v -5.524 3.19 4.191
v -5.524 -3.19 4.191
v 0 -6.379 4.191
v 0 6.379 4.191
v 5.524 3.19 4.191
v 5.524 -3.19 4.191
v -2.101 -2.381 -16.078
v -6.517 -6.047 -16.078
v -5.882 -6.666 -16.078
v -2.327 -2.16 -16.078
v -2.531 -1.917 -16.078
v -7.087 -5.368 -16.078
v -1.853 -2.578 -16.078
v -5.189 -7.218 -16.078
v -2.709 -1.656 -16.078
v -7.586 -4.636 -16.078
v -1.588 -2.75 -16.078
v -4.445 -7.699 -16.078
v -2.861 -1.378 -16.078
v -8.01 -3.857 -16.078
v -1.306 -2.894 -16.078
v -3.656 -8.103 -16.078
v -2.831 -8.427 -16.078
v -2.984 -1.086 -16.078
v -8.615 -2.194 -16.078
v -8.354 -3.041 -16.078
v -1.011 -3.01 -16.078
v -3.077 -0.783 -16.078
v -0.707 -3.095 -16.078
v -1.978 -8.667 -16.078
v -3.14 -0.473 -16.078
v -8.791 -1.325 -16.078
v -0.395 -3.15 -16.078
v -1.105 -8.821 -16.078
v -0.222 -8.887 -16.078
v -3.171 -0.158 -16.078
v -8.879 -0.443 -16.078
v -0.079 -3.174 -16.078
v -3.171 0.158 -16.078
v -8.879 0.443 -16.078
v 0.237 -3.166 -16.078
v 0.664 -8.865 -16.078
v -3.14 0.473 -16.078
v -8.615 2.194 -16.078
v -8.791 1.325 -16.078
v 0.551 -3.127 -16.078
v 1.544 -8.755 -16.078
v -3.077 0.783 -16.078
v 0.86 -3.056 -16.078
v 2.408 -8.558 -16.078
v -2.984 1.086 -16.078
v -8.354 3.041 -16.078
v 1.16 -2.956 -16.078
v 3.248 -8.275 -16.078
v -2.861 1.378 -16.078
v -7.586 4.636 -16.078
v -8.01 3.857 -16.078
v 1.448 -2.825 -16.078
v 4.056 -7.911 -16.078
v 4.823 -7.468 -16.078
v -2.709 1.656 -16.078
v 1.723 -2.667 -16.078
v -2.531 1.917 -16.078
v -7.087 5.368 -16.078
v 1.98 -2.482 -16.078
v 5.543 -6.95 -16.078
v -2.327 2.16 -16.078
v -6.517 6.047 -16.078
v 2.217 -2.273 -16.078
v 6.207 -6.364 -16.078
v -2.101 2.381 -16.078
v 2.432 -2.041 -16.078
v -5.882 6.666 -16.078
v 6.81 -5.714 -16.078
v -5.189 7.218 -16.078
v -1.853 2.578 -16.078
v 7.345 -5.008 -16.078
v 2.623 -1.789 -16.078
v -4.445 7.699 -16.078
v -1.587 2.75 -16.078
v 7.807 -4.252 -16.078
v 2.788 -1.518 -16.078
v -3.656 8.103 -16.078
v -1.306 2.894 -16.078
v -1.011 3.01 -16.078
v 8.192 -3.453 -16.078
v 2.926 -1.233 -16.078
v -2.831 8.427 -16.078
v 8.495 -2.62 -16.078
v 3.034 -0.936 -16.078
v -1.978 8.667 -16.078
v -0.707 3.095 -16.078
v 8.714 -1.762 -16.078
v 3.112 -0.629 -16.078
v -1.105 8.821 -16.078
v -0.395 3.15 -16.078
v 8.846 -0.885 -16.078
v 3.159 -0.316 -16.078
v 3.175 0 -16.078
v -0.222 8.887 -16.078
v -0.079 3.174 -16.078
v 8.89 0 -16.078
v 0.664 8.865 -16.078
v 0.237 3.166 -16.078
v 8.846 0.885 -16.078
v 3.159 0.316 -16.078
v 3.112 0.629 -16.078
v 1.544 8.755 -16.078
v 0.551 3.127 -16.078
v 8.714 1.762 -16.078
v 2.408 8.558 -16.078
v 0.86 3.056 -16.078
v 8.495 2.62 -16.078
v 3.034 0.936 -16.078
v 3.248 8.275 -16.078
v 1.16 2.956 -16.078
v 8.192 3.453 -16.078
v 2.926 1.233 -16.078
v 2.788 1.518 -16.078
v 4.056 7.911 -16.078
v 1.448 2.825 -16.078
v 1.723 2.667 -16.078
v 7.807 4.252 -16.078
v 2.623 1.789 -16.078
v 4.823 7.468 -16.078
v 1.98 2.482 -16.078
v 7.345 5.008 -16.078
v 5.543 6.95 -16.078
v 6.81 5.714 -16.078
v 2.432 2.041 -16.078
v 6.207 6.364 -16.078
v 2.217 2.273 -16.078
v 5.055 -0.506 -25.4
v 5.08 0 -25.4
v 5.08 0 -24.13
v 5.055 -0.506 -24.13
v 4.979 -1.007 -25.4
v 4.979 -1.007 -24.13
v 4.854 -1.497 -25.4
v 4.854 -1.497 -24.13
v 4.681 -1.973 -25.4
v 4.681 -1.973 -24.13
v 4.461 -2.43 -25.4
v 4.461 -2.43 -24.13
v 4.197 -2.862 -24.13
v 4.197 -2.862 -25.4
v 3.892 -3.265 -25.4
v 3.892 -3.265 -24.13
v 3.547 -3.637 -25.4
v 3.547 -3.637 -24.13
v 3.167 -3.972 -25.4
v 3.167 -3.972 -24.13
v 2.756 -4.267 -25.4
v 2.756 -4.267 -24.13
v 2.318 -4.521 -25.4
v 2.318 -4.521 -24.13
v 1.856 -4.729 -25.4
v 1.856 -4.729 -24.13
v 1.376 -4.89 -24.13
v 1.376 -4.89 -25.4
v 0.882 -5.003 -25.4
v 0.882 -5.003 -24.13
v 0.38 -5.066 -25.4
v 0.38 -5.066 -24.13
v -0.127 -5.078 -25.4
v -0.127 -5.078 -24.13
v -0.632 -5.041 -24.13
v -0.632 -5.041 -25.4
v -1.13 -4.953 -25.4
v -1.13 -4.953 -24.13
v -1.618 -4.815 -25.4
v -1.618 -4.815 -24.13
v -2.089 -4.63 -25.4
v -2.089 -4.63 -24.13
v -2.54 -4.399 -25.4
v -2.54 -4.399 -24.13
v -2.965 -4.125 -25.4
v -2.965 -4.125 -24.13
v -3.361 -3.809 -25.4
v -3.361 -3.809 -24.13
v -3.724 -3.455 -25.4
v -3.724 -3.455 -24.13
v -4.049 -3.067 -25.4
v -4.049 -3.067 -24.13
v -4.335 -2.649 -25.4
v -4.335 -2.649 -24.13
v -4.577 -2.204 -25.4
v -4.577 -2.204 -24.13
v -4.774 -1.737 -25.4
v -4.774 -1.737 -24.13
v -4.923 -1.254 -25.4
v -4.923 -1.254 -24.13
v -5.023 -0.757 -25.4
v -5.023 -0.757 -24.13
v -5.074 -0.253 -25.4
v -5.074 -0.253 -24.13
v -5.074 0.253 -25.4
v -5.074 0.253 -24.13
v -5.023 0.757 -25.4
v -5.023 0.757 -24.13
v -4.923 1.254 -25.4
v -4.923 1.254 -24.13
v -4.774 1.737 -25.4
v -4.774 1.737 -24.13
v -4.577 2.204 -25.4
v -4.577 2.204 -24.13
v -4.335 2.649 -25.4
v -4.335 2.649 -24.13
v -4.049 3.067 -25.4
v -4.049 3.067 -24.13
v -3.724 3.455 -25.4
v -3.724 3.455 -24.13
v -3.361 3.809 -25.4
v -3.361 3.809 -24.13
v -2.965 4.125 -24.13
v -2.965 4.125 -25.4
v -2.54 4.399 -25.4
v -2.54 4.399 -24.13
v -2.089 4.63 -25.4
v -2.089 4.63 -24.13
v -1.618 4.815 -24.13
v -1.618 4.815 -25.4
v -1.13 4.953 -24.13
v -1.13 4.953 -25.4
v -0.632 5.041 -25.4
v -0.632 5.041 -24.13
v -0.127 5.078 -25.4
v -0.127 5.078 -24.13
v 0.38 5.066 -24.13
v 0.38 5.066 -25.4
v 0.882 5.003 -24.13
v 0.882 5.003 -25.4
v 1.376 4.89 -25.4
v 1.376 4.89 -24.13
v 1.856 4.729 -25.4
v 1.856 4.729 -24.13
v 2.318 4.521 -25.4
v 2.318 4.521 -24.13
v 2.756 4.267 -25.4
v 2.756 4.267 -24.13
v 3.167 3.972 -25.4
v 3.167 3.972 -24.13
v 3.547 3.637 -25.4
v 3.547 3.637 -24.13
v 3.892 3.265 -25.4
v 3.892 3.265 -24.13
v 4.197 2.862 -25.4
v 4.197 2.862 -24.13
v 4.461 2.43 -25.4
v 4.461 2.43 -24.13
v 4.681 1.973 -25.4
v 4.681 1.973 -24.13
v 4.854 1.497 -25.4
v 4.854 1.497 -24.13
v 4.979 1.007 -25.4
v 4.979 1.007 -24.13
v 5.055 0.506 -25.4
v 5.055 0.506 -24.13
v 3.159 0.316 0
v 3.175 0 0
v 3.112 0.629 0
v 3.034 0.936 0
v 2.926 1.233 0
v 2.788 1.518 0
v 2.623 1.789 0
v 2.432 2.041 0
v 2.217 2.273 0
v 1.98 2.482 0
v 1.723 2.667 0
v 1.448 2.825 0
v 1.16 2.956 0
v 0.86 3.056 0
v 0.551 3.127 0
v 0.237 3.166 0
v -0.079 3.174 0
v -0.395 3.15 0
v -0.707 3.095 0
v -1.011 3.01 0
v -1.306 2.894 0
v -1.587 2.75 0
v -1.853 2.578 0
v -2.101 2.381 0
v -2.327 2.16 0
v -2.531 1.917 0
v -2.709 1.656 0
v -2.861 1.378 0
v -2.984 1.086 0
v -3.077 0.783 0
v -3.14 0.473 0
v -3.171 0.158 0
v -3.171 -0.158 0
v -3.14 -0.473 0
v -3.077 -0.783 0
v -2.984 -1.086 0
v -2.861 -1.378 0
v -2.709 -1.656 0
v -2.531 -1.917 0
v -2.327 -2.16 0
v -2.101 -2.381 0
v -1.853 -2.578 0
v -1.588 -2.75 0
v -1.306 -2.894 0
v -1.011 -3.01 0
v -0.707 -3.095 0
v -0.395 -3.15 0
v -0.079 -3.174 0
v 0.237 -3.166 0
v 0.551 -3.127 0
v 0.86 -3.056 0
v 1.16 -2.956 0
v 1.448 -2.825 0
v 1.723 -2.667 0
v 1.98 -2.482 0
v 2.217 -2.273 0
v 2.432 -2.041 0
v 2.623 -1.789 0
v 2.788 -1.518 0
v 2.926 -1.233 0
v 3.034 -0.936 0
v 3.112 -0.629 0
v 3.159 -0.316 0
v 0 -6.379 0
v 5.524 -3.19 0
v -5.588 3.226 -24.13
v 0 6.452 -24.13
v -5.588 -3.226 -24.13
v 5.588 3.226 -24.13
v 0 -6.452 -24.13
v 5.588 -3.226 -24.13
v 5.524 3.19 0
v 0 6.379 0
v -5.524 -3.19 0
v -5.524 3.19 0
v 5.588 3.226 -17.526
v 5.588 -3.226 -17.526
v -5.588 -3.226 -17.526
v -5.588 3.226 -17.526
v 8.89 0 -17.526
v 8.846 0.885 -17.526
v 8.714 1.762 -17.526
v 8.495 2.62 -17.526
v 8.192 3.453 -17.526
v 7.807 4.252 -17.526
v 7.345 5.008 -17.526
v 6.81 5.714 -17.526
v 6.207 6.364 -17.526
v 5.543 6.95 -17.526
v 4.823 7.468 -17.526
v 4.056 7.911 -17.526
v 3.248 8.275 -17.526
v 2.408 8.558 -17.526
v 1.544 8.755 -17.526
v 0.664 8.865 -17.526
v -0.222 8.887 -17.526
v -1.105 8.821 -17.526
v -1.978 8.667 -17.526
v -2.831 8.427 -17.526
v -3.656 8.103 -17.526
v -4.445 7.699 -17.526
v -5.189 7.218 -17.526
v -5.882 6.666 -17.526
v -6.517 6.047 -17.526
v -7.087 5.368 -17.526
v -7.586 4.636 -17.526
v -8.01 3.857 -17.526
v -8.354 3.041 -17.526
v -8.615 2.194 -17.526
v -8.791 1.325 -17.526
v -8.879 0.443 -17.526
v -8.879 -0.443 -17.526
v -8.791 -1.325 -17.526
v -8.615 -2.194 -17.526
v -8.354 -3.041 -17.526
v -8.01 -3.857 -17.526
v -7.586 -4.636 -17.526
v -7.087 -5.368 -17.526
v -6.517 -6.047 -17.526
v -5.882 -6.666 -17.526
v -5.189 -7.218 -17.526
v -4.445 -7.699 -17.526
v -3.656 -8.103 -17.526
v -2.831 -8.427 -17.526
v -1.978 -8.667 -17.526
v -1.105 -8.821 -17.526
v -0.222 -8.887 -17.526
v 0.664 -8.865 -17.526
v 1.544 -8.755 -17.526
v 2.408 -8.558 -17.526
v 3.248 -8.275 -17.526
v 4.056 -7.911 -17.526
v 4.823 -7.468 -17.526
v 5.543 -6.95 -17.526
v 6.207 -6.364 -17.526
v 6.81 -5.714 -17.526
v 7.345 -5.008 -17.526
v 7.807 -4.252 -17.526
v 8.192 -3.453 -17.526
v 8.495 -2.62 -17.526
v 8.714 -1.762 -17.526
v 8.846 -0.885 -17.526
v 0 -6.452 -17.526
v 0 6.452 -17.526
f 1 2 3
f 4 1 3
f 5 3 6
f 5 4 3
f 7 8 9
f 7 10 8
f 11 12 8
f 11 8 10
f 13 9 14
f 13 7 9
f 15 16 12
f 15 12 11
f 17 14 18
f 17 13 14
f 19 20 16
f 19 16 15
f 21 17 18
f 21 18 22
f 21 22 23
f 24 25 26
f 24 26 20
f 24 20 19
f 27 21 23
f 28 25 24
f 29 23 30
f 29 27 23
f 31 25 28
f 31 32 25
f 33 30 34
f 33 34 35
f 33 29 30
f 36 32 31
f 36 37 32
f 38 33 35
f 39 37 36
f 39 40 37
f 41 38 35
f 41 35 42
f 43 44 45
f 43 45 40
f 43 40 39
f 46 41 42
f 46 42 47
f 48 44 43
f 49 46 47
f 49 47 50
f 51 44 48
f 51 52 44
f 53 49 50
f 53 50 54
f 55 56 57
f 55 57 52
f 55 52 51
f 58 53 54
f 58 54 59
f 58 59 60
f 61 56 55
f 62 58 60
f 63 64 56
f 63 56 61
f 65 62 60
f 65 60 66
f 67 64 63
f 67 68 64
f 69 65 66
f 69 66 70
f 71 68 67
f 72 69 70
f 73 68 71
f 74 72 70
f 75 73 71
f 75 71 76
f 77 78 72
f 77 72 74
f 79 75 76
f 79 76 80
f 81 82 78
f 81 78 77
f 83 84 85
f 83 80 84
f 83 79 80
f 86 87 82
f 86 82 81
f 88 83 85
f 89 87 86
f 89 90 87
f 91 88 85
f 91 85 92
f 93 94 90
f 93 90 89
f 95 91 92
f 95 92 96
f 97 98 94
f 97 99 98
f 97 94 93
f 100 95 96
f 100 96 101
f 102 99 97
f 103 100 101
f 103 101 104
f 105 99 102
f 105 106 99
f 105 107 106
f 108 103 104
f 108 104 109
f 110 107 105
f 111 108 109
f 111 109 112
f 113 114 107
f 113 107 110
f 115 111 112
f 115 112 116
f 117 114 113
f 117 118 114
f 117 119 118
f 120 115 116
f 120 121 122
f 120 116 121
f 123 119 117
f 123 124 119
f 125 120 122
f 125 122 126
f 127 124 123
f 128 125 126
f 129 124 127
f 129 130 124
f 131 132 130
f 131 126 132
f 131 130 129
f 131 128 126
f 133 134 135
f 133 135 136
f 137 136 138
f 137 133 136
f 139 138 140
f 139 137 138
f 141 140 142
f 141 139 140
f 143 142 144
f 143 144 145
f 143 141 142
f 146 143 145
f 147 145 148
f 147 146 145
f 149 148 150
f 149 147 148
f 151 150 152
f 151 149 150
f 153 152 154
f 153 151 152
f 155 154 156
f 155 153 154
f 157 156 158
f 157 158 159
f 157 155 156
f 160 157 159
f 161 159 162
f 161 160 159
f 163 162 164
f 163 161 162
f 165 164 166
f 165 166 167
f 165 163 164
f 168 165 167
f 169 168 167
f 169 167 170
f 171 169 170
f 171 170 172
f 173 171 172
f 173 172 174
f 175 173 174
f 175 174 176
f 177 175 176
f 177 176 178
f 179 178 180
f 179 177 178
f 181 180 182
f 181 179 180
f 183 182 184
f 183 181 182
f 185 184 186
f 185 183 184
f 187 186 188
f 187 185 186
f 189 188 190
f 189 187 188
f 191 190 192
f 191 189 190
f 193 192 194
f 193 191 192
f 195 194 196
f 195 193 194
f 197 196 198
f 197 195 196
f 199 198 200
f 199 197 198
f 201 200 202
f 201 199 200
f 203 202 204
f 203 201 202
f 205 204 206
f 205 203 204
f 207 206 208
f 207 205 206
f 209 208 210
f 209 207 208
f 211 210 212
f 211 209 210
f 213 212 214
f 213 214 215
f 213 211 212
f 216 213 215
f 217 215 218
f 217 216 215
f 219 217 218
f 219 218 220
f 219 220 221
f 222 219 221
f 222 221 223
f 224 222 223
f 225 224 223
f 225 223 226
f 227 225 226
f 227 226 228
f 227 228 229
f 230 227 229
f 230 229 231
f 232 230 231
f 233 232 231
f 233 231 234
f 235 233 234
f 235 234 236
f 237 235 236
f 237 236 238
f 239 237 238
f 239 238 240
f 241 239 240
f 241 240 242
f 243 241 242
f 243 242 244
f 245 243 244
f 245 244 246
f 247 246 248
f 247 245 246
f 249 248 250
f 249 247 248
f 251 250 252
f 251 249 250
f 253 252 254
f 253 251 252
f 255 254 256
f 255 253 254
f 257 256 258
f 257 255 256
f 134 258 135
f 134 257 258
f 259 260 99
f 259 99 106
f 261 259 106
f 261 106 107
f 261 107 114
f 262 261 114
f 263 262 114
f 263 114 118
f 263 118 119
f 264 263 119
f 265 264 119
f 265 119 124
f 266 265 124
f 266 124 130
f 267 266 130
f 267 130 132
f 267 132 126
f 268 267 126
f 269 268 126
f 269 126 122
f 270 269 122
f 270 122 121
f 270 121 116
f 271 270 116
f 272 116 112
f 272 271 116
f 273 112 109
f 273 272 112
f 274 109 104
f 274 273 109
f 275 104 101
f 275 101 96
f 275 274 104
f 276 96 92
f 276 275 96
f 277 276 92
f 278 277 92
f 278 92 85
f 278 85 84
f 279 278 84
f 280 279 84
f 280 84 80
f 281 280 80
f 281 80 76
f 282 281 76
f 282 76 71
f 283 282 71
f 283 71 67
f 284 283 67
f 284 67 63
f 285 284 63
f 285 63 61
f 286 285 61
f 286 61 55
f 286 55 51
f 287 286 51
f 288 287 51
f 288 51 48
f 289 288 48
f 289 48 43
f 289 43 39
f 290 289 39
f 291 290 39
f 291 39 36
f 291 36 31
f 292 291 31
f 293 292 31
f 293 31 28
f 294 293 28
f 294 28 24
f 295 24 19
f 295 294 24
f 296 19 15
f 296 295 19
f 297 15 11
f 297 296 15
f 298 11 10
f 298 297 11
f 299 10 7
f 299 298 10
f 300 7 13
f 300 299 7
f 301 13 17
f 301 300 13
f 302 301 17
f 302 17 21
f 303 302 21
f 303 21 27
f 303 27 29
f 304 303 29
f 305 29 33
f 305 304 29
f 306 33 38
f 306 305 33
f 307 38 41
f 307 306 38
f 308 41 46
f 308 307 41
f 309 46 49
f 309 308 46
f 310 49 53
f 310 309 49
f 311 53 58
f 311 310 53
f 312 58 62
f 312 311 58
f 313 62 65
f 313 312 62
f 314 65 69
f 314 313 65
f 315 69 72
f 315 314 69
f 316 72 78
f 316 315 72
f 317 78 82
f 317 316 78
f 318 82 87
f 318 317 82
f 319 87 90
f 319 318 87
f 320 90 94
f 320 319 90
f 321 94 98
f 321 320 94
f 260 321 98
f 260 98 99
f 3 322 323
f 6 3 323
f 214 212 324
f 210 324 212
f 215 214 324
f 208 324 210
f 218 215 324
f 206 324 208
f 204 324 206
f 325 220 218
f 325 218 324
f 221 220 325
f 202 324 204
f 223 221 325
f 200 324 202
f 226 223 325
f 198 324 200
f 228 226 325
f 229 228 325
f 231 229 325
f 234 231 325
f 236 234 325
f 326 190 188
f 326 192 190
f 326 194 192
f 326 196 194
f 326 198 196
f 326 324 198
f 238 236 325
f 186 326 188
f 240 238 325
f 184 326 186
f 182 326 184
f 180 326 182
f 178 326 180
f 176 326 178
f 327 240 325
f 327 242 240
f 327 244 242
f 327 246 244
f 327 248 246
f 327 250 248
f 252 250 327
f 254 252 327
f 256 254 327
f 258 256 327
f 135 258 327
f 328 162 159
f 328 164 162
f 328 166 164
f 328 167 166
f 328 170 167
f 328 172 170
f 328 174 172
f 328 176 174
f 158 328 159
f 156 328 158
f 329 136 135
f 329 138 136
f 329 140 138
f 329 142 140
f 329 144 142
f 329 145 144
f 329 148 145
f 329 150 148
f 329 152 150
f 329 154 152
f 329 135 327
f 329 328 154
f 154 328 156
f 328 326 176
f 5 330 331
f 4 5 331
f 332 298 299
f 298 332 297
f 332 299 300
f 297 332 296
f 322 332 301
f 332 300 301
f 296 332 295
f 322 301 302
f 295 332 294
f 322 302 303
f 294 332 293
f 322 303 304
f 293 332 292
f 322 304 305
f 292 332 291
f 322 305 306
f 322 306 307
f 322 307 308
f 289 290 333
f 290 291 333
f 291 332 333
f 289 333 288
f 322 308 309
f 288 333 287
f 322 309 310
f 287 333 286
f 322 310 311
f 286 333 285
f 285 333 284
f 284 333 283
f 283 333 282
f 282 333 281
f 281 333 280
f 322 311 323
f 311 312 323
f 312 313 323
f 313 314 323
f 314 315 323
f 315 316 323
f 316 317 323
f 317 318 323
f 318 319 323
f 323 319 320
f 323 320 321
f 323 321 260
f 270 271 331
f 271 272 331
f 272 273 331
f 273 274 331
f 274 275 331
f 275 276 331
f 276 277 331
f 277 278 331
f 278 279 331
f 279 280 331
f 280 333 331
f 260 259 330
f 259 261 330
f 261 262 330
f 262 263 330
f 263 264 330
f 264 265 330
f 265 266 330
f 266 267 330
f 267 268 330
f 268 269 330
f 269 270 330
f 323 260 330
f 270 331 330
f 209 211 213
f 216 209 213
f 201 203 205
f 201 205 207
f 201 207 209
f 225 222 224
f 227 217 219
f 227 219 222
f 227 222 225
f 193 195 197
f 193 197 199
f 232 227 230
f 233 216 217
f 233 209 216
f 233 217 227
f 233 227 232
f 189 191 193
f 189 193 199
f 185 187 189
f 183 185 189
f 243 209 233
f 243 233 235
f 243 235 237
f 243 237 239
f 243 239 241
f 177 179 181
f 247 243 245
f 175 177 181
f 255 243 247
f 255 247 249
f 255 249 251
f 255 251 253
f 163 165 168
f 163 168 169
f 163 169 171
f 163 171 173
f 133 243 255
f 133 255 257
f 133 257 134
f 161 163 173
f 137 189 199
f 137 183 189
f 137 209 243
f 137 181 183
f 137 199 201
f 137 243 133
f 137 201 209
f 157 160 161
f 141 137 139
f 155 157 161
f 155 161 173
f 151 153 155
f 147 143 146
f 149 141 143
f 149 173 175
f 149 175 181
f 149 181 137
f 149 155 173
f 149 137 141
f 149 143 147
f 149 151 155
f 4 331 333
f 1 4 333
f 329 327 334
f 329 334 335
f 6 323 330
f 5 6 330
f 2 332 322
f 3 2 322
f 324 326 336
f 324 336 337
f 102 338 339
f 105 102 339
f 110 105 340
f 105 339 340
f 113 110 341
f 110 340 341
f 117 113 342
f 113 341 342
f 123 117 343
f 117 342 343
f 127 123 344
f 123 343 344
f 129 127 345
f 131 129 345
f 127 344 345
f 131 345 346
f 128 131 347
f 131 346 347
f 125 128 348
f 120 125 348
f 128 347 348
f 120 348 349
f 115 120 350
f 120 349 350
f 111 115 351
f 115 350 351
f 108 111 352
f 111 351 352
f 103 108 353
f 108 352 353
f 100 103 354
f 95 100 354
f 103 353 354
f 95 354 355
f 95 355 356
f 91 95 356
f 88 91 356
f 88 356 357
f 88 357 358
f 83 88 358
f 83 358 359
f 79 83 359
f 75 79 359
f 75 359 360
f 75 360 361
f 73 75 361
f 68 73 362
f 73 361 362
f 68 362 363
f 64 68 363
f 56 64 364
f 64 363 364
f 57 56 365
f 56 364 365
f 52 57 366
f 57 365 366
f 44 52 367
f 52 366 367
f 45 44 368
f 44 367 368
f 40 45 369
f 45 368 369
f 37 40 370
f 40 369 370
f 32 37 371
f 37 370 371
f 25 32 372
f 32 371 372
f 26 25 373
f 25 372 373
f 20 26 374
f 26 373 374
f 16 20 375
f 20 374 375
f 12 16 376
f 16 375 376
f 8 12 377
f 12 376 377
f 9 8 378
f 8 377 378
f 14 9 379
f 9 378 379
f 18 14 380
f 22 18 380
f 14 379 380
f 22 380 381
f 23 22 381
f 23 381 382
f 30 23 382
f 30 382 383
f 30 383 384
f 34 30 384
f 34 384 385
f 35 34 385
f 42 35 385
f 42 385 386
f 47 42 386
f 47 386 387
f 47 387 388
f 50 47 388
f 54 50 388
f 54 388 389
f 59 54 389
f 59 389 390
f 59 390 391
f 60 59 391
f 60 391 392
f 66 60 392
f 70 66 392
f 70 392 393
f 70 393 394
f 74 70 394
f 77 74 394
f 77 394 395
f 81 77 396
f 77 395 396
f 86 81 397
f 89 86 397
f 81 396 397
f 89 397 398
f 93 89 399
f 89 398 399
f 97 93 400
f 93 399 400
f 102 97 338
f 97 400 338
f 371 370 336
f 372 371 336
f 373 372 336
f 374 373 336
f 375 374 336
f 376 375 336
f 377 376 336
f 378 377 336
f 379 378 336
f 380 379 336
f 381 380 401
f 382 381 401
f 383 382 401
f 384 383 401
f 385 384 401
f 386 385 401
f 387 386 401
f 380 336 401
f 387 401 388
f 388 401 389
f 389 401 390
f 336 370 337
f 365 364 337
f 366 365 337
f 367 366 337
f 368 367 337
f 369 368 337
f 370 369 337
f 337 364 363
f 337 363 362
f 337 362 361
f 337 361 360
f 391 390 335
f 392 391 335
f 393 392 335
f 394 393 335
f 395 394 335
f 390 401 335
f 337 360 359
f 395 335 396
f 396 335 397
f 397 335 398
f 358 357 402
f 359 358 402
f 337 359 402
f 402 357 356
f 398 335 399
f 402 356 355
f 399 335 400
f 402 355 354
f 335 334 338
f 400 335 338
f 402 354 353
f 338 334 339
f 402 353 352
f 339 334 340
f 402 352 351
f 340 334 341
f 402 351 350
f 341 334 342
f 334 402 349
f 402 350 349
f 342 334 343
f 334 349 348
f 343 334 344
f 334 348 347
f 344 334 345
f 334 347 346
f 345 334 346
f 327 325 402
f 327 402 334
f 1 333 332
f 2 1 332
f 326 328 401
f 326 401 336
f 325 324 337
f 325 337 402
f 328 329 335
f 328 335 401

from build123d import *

# Parameters (mm, degrees)
F0_R     = 3.175
F1_DEPTH = 25.4
F3_DEPTH = 4.191
F5_DEPTH = 7.874
F6_R     = 8.89
F7_DEPTH = 1.4478
F8_R     = 5.08
F9_DEPTH = 1.27


with BuildPart() as f1:
    # F0 (on Top) → F1 (new body)
    with BuildSketch(Plane.XY):
        Circle(F0_R)
    extrude(amount=-F1_DEPTH)

    # F2 (on face) → F3 (join)
    with BuildSketch(Plane.XY):
        Polygon((5.5245, 3.189572), (0, 6.379143), (-5.5245, 3.189572), (-5.5245, -3.189572), (0, -6.379143), (5.5245, -3.189572), align=None)
    extrude(amount=F3_DEPTH)

    # F4 (on face) → F5 (join)
    with BuildSketch(Plane(origin=(0, 0, -25.4), x_dir=(1, 0, 0), z_dir=(0, 0, -1))):
        Polygon((5.588, 3.226233), (0, 6.452467), (-5.588, 3.226233), (-5.588, -3.226233), (0, -6.452467), (5.588, -3.226233), align=None)
    extrude(amount=-F5_DEPTH)

    # F6 (on face) → F7 (join)
    with BuildSketch(Plane.XY.offset(-17.526)):
        Circle(F6_R)
    extrude(amount=F7_DEPTH)

    # F8 (on face) → F9 (cut)
    with BuildSketch(Plane(origin=(0, 0, -25.4), x_dir=(1, 0, 0), z_dir=(0, 0, -1))):
        Polygon((5.588, -3.226233), (5.588, 3.226233), (0, 6.452467), (-5.588, 3.226233), (-5.588, -3.226233), (0, -6.452467), align=None)
        Circle(F8_R, mode=Mode.SUBTRACT)
    extrude(amount=-F9_DEPTH, mode=Mode.SUBTRACT)


solid = f1.part
